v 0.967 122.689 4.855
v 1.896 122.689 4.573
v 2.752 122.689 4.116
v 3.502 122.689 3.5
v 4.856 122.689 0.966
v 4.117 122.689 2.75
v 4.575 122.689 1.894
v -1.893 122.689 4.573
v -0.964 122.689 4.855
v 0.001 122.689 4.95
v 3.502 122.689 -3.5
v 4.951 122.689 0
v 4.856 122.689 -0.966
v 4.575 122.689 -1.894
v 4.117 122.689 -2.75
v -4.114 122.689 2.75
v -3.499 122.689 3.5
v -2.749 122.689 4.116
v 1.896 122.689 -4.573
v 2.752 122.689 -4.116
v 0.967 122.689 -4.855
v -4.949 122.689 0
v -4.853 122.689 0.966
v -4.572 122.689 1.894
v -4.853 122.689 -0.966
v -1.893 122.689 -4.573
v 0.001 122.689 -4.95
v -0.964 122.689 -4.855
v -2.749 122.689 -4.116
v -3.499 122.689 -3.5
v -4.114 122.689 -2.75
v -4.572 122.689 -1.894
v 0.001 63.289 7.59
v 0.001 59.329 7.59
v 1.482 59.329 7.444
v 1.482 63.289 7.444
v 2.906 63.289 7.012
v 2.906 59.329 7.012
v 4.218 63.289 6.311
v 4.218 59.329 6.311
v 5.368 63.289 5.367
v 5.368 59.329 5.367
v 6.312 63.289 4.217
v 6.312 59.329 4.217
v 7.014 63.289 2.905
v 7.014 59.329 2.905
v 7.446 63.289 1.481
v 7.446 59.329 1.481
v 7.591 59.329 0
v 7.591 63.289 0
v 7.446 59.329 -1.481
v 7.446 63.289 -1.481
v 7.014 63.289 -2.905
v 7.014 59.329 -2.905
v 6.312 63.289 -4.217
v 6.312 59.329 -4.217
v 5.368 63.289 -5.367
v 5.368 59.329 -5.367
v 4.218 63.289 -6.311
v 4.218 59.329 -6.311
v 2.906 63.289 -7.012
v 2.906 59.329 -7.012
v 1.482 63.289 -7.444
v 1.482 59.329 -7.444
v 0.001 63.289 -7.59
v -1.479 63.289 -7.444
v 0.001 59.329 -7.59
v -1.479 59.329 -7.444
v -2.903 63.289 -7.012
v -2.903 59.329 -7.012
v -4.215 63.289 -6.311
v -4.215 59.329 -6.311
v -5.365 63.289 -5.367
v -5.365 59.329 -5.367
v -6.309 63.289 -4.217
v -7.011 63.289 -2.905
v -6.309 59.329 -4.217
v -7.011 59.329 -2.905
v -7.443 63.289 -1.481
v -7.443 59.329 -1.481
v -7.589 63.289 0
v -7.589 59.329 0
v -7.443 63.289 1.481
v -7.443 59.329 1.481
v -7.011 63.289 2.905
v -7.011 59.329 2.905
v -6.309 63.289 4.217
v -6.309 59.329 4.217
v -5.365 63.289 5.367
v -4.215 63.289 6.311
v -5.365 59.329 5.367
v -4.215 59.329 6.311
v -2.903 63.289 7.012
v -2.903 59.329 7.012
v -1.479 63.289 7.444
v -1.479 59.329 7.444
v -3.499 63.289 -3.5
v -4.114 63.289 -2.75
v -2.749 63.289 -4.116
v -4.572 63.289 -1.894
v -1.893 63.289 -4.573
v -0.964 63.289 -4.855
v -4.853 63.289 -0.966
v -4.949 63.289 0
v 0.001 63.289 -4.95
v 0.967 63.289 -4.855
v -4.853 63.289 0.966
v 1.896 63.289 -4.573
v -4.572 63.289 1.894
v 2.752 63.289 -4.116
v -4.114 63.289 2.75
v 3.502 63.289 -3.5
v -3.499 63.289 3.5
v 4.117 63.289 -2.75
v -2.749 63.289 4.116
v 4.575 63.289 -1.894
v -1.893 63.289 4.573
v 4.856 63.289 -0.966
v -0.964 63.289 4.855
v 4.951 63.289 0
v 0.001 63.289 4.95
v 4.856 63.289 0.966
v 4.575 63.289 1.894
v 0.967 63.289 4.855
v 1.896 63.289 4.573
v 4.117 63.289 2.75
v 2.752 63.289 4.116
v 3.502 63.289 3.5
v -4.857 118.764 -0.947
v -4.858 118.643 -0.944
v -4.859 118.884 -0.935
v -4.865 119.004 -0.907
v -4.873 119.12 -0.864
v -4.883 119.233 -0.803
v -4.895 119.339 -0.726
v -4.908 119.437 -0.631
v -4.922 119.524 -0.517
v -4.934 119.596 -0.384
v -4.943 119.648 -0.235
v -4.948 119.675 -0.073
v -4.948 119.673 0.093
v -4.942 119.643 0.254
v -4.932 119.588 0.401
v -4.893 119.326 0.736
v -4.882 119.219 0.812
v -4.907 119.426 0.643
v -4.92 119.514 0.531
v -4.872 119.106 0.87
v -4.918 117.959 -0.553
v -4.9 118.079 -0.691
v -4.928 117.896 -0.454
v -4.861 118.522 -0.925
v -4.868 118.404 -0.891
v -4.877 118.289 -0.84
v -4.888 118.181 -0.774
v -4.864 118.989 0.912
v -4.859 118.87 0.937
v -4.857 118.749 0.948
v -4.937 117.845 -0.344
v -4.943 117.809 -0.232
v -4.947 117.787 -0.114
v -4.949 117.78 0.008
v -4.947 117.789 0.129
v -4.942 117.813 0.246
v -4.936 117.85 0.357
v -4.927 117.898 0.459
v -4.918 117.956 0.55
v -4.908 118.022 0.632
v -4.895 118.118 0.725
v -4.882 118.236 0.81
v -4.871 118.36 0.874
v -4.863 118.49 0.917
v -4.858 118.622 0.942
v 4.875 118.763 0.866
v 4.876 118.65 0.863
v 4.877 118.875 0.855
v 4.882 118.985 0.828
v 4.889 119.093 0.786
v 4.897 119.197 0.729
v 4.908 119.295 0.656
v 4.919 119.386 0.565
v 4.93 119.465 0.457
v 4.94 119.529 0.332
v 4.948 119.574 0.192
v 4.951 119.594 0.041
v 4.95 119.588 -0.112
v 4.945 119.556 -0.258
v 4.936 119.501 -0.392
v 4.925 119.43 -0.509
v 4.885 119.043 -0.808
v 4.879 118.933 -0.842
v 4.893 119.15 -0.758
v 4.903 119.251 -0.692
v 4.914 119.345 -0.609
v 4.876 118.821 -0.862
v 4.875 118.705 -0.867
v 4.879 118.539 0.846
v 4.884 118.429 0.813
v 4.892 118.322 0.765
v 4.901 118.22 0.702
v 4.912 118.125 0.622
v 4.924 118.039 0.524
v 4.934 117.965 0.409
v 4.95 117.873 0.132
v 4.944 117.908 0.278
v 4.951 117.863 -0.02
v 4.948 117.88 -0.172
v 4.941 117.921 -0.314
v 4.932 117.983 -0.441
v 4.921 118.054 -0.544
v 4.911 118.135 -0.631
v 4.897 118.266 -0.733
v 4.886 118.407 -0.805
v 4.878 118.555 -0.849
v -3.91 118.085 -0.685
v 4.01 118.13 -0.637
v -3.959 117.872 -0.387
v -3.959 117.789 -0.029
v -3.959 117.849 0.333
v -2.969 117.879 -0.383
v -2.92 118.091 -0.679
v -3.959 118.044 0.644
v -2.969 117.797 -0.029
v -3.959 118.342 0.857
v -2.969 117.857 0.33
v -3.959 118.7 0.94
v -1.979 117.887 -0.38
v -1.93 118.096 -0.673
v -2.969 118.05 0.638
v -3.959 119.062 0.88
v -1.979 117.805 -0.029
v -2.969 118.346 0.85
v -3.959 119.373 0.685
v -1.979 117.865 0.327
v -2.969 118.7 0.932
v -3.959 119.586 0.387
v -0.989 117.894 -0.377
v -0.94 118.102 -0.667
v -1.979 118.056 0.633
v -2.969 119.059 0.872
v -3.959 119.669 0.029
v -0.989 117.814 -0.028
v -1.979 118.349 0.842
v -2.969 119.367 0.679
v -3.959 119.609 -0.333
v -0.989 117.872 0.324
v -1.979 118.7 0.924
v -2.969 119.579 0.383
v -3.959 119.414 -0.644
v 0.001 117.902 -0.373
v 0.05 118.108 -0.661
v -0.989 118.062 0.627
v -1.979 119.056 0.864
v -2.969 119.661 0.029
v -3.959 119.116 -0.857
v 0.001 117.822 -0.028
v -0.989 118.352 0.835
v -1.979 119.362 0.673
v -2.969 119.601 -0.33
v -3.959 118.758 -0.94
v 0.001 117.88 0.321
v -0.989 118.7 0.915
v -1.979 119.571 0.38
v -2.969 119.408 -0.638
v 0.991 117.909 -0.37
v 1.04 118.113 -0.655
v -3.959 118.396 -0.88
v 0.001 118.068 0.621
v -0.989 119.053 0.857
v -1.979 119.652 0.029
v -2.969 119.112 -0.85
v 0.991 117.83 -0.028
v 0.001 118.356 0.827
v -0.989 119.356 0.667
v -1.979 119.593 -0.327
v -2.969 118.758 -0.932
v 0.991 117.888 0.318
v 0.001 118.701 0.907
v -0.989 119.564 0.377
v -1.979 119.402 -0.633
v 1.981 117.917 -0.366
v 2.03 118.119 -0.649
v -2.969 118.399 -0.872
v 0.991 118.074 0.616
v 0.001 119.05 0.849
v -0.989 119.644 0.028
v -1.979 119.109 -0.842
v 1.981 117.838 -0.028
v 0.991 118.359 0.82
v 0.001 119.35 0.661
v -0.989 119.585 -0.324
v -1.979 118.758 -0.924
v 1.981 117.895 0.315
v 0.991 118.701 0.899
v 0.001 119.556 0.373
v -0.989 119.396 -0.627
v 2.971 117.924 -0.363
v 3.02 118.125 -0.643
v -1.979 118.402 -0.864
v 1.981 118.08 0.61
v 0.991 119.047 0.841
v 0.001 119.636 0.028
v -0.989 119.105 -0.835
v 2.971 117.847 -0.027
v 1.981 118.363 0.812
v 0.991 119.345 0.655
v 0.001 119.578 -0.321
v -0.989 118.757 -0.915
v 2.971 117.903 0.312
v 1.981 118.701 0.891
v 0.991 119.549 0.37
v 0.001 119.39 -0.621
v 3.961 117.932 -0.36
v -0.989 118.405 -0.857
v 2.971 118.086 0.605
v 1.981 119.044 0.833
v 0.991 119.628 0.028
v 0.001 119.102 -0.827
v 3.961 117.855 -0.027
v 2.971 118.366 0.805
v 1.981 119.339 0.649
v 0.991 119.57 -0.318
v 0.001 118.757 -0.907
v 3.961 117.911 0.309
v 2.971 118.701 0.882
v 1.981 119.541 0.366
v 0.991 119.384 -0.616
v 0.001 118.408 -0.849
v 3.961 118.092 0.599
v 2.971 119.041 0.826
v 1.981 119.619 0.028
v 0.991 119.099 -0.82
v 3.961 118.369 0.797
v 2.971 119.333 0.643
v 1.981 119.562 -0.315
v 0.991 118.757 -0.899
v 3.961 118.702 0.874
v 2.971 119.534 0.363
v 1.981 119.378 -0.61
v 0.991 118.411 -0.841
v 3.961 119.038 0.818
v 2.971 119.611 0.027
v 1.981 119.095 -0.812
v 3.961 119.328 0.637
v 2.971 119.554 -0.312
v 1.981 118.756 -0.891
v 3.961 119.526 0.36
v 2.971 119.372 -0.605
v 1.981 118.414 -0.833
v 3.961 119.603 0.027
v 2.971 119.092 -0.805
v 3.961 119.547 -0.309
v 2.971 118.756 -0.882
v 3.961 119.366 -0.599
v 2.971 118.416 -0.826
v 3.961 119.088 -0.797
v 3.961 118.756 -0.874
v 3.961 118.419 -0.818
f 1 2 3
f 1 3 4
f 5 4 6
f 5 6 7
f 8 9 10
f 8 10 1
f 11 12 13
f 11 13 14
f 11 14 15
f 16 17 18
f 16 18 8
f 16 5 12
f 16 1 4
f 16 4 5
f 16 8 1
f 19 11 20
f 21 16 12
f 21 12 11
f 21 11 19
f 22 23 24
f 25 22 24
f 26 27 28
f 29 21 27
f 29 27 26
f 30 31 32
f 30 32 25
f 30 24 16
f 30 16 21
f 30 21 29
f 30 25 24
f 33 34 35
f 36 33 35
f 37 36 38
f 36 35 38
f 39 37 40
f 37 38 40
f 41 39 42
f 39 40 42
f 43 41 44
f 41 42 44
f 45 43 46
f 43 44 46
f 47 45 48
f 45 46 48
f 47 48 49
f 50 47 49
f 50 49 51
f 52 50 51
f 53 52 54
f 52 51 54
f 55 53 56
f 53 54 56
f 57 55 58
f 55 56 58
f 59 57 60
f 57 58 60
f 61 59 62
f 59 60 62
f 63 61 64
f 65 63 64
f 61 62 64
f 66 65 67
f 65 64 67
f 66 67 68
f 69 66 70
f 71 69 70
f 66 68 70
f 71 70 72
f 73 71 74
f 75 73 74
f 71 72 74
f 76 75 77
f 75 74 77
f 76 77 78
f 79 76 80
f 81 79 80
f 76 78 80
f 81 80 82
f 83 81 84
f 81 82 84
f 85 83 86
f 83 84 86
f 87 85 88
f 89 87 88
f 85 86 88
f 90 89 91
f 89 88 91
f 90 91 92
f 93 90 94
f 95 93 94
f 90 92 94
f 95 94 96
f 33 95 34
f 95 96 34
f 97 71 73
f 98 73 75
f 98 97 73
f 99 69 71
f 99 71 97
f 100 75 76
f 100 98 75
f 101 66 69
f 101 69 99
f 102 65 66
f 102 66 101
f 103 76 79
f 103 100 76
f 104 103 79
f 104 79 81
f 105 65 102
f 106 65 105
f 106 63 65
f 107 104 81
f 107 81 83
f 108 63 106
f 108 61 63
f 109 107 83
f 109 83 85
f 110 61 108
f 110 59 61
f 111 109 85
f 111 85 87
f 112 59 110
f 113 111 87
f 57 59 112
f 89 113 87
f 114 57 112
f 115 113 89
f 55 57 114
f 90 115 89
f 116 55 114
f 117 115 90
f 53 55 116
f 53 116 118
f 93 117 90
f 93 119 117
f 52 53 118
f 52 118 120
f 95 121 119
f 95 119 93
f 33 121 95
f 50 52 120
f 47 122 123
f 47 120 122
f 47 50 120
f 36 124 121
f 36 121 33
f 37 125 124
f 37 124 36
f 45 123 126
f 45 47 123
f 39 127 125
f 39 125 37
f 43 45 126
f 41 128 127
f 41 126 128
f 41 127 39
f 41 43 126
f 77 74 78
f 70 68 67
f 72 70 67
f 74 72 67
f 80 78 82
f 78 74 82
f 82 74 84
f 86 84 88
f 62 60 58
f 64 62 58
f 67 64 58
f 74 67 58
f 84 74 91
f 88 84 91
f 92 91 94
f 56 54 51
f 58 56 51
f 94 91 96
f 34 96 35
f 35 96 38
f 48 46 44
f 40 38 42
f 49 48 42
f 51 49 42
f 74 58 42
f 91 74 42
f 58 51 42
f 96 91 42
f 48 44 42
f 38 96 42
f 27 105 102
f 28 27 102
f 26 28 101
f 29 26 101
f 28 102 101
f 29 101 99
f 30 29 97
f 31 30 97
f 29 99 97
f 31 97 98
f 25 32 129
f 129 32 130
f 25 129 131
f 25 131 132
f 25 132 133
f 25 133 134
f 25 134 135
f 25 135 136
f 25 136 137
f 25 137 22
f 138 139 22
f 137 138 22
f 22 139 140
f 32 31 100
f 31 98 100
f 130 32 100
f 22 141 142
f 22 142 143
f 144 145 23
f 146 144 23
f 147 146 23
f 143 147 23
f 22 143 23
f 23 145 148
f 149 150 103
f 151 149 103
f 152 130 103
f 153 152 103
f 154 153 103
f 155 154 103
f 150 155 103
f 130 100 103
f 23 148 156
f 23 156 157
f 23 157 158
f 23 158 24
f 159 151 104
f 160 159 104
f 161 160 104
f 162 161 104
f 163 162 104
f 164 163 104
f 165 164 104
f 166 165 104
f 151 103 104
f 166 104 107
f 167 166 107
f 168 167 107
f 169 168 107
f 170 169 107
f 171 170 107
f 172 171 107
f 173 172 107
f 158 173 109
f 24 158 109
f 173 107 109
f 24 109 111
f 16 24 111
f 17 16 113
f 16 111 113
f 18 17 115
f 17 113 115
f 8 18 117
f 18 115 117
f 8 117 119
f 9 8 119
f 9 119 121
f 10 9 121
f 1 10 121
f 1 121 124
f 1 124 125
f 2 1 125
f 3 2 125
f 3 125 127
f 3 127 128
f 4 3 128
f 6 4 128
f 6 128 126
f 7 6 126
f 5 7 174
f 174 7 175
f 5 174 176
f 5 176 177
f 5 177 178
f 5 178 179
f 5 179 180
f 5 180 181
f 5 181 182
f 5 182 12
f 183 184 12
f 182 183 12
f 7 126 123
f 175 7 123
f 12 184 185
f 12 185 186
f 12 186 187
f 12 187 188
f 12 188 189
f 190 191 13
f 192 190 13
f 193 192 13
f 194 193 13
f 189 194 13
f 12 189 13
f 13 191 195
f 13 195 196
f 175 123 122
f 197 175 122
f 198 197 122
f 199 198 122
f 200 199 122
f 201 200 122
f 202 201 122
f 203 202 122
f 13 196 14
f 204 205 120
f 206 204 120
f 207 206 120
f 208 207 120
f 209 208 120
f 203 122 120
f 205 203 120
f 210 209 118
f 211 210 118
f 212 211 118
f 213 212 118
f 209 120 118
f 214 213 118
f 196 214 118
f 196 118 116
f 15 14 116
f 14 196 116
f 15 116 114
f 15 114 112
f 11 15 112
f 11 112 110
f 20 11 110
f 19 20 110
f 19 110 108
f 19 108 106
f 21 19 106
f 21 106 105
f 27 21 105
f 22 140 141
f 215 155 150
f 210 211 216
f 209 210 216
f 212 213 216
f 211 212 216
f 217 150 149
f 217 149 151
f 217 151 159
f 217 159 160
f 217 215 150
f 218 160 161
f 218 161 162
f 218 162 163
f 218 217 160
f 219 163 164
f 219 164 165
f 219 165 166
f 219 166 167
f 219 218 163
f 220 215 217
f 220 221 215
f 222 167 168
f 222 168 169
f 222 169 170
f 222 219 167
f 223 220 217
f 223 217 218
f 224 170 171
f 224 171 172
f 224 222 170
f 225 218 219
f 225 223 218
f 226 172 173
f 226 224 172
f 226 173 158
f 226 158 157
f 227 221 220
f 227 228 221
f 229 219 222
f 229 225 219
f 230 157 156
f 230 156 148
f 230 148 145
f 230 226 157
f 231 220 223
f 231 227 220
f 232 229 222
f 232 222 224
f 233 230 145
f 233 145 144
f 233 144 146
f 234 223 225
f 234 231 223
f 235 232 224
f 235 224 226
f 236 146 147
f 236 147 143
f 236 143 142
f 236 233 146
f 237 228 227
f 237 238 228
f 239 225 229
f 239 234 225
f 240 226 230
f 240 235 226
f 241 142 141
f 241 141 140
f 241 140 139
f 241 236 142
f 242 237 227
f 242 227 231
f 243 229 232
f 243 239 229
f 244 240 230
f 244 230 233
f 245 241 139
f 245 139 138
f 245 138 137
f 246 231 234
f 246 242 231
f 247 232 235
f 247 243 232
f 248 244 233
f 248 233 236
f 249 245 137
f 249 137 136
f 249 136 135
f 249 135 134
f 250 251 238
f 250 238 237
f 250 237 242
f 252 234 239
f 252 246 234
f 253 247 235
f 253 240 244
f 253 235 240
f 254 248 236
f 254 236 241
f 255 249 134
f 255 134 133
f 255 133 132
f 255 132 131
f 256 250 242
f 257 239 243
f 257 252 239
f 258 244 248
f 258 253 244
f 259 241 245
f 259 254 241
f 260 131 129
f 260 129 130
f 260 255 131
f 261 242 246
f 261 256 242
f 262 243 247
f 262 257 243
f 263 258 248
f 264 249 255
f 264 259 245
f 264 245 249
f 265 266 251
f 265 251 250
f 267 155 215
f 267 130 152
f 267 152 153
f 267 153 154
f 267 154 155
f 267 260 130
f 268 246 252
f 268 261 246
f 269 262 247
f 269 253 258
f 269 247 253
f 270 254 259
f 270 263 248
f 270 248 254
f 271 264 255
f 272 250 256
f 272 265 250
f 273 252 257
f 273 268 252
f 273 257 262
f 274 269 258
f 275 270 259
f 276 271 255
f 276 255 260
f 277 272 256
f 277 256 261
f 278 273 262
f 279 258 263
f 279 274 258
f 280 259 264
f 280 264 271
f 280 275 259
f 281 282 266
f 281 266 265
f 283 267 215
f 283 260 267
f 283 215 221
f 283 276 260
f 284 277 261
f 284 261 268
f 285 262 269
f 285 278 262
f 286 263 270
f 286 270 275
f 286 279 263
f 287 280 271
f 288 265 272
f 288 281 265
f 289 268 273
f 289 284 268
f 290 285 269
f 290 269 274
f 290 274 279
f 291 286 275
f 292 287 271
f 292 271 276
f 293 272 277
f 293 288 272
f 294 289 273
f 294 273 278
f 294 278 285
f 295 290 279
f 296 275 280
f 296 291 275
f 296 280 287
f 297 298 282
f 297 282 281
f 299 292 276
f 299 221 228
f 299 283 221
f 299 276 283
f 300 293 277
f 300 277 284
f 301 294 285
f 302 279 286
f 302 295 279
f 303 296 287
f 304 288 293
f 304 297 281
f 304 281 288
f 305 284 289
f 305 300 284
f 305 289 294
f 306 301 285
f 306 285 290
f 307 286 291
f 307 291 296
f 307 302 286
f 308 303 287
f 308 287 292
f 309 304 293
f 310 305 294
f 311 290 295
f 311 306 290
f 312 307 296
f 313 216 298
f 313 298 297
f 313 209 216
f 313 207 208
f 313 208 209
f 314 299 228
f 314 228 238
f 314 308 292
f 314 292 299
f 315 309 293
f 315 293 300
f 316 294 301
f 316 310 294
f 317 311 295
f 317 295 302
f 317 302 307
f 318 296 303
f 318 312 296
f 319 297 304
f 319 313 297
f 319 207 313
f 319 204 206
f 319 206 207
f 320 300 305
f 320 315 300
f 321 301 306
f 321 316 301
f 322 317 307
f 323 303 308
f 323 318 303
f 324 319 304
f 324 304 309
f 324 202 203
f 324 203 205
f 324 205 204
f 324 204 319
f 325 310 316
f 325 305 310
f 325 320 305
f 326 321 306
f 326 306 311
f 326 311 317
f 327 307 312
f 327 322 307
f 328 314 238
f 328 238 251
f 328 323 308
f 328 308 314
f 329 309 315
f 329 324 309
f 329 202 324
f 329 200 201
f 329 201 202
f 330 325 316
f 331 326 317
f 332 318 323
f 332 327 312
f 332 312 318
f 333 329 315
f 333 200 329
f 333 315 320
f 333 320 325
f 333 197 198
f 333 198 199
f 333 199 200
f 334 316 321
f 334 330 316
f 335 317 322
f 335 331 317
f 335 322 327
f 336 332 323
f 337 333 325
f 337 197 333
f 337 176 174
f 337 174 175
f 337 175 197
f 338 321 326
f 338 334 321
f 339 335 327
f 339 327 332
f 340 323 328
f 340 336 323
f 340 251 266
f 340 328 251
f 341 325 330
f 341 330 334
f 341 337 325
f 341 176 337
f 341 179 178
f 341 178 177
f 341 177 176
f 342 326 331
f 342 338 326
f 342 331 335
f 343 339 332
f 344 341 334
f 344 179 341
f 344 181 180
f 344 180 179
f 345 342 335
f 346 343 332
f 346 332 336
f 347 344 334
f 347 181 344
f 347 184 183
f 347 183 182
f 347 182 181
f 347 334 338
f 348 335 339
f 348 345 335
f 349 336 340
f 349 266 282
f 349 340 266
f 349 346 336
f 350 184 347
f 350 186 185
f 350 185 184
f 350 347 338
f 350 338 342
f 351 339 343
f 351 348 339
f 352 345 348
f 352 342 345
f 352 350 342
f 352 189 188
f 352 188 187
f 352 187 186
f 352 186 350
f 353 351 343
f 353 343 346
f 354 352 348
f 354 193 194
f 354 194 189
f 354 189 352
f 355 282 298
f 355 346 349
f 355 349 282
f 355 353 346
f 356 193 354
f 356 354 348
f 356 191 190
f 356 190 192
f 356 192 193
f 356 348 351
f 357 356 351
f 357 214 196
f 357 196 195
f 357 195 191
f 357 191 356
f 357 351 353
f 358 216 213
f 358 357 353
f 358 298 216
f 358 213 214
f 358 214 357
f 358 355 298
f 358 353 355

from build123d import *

# Parameters (mm, degrees)
SKETCH1_R           = 23
BOSS_EXTRUDE1_DEPTH = 12
SKETCH2_R           = 15
BOSS_EXTRUDE2_DEPTH = 180
SCALE1_SCALE        = 0.33


with BuildPart() as part:
    # Sketch1 → Boss-Extrude1 (new body)
    with BuildSketch(Plane(origin=(0, 0, 0), x_dir=(1, 0, 0), z_dir=(0, 1, 0))):
        with Locations(Location((0, 0, 0), (0, 0, 270))):
            Circle(SKETCH1_R)
    extrude(amount=BOSS_EXTRUDE1_DEPTH)

    # Sketch2 → Boss-Extrude2 (add)
    with BuildSketch(Plane(origin=(0, 12, 0), x_dir=(1, 0, 0), z_dir=(0, 1, 0))):
        with Locations(Location((0, 0, 0), (0, 0, 90))):
            Circle(SKETCH2_R)
    extrude(amount=BOSS_EXTRUDE2_DEPTH)

    # Sketch4 → Cut-Revolve4 (revolve, cut)
    with BuildSketch(Plane(origin=(0, 180, 0), x_dir=(1, 0, 0), z_dir=(0, 1, 0)), mode=Mode.PRIVATE) as cut_revolve4_sk:
        Polygon((30, 0), (-30, 0), (-30, 3), (30, 2.5), align=None)
    revolve(cut_revolve4_sk.sketch.rotate(Axis((30, 180, 0), (-1, 0, 0)), 43.222244731), axis=Axis((30, 180, 0), (-1, 0, 0)), mode=Mode.SUBTRACT)


with BuildPart() as part_1:
    # Scale1: scaled about (0.002156462, 88.550518563, 3e-09)
    add(part.part.scale(SCALE1_SCALE).moved(Location((0.00144483, 59.328847437, 2e-09))))


solid = part_1.part
